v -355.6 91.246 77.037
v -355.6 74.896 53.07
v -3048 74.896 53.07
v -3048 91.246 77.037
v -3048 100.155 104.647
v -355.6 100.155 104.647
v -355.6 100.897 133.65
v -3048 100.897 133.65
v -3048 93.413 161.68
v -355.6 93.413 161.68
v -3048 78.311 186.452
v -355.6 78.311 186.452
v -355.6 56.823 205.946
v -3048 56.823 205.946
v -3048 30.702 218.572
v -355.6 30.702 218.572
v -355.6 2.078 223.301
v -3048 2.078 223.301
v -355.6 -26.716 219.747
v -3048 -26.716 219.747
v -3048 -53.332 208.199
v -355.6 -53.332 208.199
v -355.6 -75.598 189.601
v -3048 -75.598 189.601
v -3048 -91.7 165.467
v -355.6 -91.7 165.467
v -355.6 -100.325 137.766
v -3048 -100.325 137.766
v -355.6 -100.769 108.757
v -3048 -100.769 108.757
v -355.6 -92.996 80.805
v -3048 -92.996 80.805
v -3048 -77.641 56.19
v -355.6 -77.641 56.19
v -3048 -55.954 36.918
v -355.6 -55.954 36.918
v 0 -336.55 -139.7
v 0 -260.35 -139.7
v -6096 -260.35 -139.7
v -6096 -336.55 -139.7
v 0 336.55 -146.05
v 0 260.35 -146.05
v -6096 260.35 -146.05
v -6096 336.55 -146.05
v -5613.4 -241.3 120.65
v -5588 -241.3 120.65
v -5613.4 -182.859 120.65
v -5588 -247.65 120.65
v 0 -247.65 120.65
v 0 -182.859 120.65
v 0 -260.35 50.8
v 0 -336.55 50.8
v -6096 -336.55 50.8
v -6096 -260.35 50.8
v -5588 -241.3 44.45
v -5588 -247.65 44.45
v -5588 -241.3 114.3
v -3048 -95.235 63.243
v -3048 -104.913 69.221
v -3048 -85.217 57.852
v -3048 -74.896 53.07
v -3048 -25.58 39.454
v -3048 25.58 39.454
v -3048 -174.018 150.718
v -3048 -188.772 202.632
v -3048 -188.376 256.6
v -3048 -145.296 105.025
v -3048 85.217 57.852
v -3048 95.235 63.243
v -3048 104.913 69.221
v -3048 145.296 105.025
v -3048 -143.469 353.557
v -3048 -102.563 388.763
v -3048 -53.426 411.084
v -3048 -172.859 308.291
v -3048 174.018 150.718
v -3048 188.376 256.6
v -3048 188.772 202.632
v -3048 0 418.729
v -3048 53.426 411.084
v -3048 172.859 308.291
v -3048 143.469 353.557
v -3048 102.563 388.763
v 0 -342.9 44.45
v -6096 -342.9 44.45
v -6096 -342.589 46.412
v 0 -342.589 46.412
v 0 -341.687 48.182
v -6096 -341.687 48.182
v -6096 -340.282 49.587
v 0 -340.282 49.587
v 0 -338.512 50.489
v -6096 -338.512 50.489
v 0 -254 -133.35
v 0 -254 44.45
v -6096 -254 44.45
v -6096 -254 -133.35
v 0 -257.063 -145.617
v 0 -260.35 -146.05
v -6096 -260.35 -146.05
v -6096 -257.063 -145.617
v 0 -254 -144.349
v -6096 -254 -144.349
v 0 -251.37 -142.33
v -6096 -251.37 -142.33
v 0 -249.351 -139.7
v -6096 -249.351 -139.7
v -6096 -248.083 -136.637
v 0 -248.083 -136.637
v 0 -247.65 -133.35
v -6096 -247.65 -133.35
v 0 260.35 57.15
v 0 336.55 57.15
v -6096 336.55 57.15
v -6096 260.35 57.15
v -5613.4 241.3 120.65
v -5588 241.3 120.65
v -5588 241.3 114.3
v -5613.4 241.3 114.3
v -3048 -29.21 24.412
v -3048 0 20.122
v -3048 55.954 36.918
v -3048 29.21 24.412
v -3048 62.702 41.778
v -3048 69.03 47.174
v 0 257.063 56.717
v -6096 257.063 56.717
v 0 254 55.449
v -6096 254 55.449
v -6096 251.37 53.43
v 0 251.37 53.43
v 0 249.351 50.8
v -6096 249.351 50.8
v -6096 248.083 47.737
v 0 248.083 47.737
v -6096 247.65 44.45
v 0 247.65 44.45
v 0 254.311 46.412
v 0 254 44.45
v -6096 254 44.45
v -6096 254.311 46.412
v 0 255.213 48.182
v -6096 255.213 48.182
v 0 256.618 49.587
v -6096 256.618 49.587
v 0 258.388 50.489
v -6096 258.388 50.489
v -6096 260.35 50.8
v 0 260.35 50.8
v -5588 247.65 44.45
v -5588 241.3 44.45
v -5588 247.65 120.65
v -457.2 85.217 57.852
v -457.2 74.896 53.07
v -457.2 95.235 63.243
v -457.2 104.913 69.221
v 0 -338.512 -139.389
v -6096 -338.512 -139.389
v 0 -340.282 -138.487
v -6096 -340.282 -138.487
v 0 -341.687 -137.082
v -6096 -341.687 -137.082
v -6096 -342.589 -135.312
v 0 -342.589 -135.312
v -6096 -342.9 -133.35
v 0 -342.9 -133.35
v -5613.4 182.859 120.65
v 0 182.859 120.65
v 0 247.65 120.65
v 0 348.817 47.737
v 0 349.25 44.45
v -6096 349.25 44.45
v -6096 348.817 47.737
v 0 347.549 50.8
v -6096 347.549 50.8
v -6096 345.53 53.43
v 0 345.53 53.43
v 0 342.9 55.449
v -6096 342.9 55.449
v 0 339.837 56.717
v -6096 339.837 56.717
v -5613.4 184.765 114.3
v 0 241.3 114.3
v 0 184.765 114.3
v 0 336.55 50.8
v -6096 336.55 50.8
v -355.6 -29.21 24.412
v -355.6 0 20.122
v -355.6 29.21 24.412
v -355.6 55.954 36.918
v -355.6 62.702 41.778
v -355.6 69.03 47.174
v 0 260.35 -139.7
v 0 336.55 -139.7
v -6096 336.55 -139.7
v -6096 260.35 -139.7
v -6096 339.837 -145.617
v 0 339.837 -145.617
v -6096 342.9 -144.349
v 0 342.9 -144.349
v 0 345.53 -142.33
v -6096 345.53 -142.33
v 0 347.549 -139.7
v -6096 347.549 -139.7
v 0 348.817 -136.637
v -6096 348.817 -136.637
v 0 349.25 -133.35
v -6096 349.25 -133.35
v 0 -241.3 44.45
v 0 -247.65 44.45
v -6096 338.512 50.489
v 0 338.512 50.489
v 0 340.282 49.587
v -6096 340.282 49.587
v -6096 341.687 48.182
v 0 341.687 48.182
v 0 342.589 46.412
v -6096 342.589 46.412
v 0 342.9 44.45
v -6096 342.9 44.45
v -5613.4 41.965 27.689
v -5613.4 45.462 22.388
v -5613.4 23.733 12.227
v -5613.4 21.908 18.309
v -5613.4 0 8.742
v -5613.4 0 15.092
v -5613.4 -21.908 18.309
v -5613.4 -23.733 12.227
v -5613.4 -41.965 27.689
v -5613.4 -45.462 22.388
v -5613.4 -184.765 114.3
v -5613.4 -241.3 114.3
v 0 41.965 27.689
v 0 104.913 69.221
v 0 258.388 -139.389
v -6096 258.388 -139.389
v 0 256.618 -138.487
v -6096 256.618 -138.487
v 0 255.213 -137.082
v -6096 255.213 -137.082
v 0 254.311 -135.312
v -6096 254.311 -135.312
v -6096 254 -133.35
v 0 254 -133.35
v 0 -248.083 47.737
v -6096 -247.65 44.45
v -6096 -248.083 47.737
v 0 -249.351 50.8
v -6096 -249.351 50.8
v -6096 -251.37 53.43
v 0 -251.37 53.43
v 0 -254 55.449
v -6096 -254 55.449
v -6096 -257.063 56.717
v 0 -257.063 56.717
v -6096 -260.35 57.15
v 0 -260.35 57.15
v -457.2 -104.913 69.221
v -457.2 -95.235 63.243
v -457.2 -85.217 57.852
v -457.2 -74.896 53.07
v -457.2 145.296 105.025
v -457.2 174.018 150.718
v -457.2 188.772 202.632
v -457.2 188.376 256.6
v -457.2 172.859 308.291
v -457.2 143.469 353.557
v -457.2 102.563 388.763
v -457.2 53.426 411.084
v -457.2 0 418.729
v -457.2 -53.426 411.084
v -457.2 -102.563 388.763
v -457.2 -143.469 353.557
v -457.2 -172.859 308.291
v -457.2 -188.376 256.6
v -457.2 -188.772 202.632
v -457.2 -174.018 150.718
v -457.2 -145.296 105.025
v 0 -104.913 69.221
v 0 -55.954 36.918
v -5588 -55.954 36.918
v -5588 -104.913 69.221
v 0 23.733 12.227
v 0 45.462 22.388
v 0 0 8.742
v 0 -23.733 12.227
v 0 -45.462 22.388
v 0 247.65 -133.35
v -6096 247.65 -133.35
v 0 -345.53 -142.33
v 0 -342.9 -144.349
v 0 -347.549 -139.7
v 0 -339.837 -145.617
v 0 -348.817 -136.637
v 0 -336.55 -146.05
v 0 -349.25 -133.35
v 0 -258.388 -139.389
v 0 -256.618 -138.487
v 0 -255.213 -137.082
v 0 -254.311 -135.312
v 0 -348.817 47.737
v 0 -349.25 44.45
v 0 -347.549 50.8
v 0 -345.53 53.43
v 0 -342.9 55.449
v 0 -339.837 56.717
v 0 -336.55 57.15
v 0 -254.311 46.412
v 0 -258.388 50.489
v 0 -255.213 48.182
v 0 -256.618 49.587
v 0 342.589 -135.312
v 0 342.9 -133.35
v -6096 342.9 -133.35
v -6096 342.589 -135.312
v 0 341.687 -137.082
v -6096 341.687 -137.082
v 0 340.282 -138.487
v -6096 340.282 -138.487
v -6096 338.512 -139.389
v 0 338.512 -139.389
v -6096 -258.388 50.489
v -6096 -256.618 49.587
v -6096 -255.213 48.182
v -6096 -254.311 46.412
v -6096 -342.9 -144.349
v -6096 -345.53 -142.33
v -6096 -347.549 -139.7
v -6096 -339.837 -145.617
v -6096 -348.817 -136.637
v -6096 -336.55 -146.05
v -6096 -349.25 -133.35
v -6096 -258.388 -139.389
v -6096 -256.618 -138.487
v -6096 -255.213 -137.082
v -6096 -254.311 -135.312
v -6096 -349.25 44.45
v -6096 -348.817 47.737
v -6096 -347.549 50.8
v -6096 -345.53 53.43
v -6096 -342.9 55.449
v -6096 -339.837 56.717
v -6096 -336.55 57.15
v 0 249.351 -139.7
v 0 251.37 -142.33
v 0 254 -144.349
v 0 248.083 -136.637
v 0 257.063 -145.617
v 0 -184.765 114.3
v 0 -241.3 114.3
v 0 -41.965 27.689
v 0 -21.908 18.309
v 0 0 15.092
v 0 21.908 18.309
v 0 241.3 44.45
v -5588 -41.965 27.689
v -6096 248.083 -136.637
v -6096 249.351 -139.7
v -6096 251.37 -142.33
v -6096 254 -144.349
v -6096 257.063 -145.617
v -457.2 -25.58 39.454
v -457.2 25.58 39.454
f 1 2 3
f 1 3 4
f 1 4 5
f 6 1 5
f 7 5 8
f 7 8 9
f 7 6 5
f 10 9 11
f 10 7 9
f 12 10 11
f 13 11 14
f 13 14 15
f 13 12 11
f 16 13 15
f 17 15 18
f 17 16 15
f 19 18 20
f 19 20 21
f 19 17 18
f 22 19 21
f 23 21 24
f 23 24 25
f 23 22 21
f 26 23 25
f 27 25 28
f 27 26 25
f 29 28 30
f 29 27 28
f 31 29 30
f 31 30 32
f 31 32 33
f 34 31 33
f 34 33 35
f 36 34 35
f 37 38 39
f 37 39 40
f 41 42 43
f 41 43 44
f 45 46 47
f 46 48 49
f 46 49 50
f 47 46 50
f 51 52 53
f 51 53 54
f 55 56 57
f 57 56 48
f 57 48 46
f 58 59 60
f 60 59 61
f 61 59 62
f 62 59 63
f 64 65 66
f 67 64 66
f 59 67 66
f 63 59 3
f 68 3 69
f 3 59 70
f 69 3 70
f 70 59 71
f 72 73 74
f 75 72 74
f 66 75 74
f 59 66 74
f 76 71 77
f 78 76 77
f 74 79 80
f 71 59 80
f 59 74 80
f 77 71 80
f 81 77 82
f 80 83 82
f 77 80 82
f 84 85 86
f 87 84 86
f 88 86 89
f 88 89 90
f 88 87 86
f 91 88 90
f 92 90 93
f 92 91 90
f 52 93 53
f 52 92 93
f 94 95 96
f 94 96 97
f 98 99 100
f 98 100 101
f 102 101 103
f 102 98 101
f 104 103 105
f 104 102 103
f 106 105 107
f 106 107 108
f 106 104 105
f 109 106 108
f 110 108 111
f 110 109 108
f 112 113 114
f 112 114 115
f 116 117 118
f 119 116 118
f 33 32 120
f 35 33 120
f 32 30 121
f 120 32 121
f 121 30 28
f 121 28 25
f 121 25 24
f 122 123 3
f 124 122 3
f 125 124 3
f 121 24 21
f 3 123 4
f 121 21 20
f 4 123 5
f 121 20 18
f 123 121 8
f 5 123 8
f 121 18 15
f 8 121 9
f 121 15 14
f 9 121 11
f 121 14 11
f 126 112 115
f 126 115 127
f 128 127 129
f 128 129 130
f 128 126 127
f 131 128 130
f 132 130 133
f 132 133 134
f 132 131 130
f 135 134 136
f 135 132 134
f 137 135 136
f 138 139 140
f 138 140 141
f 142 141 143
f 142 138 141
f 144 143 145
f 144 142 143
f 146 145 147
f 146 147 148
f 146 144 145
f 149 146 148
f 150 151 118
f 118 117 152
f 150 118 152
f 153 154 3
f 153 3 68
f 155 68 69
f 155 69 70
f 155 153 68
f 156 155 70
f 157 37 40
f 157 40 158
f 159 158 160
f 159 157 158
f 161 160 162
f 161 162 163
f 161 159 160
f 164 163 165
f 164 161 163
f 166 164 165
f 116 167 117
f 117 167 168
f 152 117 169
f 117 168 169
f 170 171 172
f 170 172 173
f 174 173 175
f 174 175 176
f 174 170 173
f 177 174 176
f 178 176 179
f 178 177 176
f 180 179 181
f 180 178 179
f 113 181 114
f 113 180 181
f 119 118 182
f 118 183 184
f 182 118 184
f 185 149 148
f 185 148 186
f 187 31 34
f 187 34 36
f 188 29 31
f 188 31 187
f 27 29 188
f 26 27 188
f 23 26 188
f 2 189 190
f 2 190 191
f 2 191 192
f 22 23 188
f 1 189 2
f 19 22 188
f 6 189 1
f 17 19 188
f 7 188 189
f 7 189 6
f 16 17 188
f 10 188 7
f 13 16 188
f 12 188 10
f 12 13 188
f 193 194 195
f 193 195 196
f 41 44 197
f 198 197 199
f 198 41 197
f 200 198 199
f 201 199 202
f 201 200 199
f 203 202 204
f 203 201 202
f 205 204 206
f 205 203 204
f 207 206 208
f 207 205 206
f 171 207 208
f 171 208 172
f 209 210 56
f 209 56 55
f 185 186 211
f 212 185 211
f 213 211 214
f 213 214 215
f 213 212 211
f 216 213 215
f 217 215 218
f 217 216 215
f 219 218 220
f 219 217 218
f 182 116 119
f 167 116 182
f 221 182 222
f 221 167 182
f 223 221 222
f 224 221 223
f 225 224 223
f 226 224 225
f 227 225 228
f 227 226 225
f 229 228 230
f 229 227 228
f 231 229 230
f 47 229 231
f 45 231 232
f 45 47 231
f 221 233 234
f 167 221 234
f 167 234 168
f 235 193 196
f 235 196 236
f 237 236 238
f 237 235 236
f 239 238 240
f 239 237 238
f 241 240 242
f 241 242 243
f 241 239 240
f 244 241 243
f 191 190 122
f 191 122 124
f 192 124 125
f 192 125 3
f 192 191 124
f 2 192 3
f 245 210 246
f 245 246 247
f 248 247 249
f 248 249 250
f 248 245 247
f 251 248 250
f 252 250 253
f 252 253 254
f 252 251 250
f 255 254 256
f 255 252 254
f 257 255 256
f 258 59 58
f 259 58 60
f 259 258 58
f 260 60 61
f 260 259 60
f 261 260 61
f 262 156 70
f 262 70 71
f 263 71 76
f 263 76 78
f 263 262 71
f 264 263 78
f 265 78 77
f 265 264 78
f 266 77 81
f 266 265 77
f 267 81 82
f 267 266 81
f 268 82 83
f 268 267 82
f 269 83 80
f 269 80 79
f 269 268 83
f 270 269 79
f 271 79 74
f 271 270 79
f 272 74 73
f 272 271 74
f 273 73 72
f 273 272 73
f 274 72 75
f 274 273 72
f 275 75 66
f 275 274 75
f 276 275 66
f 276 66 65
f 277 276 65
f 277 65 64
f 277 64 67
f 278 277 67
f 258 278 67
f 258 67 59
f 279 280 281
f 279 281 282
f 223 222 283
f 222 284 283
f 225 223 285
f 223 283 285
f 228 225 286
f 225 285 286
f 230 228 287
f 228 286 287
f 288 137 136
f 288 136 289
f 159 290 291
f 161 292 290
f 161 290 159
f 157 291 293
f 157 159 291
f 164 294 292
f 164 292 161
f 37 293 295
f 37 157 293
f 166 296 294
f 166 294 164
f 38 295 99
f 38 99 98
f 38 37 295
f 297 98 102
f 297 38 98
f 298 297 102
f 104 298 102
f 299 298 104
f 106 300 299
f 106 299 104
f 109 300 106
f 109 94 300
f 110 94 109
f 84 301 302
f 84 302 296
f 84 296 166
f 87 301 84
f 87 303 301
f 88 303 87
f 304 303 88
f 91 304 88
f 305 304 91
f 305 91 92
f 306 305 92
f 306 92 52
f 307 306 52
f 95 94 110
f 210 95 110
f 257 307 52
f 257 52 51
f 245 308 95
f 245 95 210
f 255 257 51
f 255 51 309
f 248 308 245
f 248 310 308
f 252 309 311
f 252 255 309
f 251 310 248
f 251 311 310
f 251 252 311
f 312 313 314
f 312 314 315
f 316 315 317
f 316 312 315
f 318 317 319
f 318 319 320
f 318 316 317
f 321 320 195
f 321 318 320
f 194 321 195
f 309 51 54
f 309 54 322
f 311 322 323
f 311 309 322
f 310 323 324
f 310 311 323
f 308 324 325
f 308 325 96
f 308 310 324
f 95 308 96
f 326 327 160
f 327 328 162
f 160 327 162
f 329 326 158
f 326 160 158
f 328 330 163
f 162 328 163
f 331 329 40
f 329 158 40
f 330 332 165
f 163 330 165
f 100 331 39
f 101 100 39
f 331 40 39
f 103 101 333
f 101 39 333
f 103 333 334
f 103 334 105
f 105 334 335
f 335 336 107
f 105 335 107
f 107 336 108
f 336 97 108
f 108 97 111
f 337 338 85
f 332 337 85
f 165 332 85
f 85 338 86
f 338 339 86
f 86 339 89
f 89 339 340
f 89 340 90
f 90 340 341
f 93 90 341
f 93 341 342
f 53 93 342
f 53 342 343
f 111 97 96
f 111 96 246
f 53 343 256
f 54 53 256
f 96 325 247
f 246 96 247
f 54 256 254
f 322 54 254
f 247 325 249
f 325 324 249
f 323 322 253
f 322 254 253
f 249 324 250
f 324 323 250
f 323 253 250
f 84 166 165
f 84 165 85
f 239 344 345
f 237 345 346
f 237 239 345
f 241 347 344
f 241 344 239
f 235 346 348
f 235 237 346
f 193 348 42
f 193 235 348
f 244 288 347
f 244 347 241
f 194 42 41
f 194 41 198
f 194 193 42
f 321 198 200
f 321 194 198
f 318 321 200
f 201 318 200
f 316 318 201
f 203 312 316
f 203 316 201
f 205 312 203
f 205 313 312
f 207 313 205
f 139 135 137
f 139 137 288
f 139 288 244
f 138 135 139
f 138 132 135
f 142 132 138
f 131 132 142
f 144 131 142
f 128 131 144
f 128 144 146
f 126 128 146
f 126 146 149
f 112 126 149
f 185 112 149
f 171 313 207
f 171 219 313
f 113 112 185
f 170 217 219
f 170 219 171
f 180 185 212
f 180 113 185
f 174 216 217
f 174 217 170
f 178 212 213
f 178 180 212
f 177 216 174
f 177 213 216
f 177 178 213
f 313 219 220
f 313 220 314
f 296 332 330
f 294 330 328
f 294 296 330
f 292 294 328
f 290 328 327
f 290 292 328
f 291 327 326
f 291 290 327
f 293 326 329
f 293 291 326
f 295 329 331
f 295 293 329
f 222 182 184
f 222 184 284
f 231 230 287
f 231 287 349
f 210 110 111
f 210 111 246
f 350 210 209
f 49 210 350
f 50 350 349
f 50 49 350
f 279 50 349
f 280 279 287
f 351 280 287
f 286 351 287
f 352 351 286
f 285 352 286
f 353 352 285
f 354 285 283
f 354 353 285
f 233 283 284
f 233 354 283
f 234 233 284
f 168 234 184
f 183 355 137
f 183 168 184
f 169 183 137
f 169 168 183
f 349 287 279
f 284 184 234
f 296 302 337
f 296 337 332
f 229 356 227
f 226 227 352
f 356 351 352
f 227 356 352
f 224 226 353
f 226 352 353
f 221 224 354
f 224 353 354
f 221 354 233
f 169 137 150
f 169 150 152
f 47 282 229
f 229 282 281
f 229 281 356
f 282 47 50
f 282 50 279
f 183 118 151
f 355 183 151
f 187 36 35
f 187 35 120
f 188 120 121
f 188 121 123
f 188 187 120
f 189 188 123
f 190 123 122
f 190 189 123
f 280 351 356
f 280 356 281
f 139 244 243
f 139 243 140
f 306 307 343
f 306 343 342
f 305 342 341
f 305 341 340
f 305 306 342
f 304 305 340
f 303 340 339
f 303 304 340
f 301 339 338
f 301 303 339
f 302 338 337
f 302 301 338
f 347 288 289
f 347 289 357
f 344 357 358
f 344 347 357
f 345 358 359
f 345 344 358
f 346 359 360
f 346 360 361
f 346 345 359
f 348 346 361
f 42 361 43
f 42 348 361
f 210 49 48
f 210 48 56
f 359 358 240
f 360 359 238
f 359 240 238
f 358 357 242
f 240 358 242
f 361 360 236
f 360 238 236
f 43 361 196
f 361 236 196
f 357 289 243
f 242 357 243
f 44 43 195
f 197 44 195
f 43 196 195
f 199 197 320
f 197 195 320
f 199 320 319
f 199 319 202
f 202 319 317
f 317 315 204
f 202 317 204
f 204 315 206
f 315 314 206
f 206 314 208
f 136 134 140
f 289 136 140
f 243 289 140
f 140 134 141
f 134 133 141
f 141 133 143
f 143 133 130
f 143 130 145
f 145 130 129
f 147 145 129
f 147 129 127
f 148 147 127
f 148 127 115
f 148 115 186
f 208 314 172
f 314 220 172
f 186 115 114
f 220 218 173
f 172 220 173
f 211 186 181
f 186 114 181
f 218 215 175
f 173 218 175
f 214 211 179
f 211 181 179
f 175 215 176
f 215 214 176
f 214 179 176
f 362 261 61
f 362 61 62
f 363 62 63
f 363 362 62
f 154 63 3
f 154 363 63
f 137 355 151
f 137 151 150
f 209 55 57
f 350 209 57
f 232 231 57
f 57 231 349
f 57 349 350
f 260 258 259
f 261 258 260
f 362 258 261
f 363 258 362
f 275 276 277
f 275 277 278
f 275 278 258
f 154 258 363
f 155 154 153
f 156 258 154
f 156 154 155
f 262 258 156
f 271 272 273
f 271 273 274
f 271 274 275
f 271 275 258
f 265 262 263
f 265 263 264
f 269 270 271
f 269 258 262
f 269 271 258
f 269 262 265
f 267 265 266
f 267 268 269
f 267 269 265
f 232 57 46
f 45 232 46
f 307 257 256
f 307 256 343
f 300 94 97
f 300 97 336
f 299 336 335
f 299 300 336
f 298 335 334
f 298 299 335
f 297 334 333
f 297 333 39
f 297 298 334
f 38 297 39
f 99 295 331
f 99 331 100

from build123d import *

# Parameters (mm, degrees)
F1_DEPTH = 6096
F2_DEPTH = 5588
F3_START = -355.6
F3_DEPTH = 2692.4
F4_START = -457.2
F4_DEPTH = 2590.8
F7_DEPTH = 25.4


# Not quite as in the source:
# - a feature names something its author has since deleted; it is built from what else it names


with BuildPart() as f1:
    # F0 (on Right) → F1 (new body)
    with BuildSketch(Plane.YZ):
        with BuildLine():
            Line((-278.751844046, 57.15), (-336.55, 57.15))
            ThreePointArc((-336.55, 57.15), (-345.5302561211, 53.4302561211), (-349.25, 44.45))
            Line((-349.25, 44.45), (-349.25, -133.35))
            ThreePointArc((-349.25, -133.35), (-345.5302561211, -142.3302561211), (-336.55, -146.05))
            Line((-336.55, -146.05), (-260.35, -146.05))
            ThreePointArc((-260.35, -146.05), (-251.3697438789, -142.3302561211), (-247.65, -133.35))
            Line((-247.65, -133.35), (-247.65, 44.45))
            ThreePointArc((-247.65, 44.45), (-251.3697438789, 53.4302561211), (-260.35, 57.15))
            Line((-260.35, 57.15), (-268.1402802436, 57.15))
            Line((-268.1402802436, 57.15), (-269.3472818438, 57.15))
            Line((-269.3472818438, 57.15), (-278.751844046, 57.15))
        make_face()
        with BuildLine():
            ThreePointArc((-342.9, 44.45), (-341.0401280605, 48.9401280605), (-336.55, 50.8))
            Line((-336.55, 50.8), (-260.35, 50.8))
            ThreePointArc((-260.35, 50.8), (-255.8598719395, 48.9401280605), (-254, 44.45))
            Line((-254, 44.45), (-254, -133.35))
            ThreePointArc((-254, -133.35), (-255.8598719395, -137.8401280605), (-260.35, -139.7))
            Line((-260.35, -139.7), (-336.55, -139.7))
            ThreePointArc((-336.55, -139.7), (-341.0401280605, -137.8401280605), (-342.9, -133.35))
            Line((-342.9, -133.35), (-342.9, 44.45))
        make_face(mode=Mode.SUBTRACT)
    extrude(amount=-F1_DEPTH)


with BuildPart() as f1b:
    # F0 (on Right) → F1, piece 2 (new body)
    with BuildSketch(Plane.YZ):
        with BuildLine():
            ThreePointArc((260.35, 57.15), (251.3697438789, 53.4302561211), (247.65, 44.45))
            Line((247.65, 44.45), (247.65, -133.35))
            ThreePointArc((247.65, -133.35), (251.3697438789, -142.3302561211), (260.35, -146.05))
            Line((260.35, -146.05), (336.55, -146.05))
            ThreePointArc((336.55, -146.05), (345.5302561211, -142.3302561211), (349.25, -133.35))
            Line((349.25, -133.35), (349.25, 44.45))
            ThreePointArc((349.25, 44.45), (345.5302561211, 53.4302561211), (336.55, 57.15))
            Line((336.55, 57.15), (260.35, 57.15))
        make_face()
        with BuildLine():
            Line((260.35, 50.8), (336.55, 50.8))
            ThreePointArc((336.55, 50.8), (341.0401280605, 48.9401280605), (342.9, 44.45))
            Line((342.9, 44.45), (342.9, -133.35))
            ThreePointArc((342.9, -133.35), (341.0401280605, -137.8401280605), (336.55, -139.7))
            Line((336.55, -139.7), (260.35, -139.7))
            ThreePointArc((260.35, -139.7), (255.8598719395, -137.8401280605), (254, -133.35))
            Line((254, -133.35), (254, 44.45))
            ThreePointArc((254, 44.45), (255.8598719395, 48.9401280605), (260.35, 50.8))
        make_face(mode=Mode.SUBTRACT)
    extrude(amount=-F1_DEPTH)


with BuildPart() as f2:
    # F0 (on Right) → F2 (new body)
    with BuildSketch(Plane.YZ):
        with BuildLine():
            Line((-247.65, 120.65), (-247.65, 44.45))
            Line((-247.65, 44.45), (-241.3, 44.45))
            Line((-241.3, 44.45), (-241.3, 114.3))
            Line((-241.3, 114.3), (-184.7652837227, 114.3))
            Line((-184.7652837227, 114.3), (-45.4622963682, 22.3882611001))
            ThreePointArc((-45.4622963682, 22.3882611001), (0, 8.7416870594), (45.4622963682, 22.3882611001))
            Line((45.4622963682, 22.3882611001), (184.7652837227, 114.3))
            Line((184.7652837227, 114.3), (241.3, 114.3))
            Line((241.3, 114.3), (241.3, 44.45))
            Line((241.3, 44.45), (247.65, 44.45))
            Line((247.65, 44.45), (247.65, 120.65))
            Line((247.65, 120.65), (182.8591823578, 120.65))
            Line((182.8591823578, 120.65), (104.9129874888, 69.2213088636))
            Line((104.9129874888, 69.2213088636), (55.9535927255, 36.9180309968))
            Line((55.9535927255, 36.9180309968), (41.9651966475, 27.6885246354))
            ThreePointArc((41.9651966475, 27.6885246354), (0, 15.0916870594), (-41.9651966475, 27.6885246354))
            Line((-41.9651966475, 27.6885246354), (-55.9535977541, 36.9180343146))
            Line((-55.9535977541, 36.9180343146), (-104.9129888218, 69.2213097431))
            Line((-104.9129888218, 69.2213097431), (-182.8591823578, 120.65))
            Line((-182.8591823578, 120.65), (-247.65, 120.65))
        make_face()
    extrude(amount=-F2_DEPTH)

    # F6 (on face) → F7 (join)
    with BuildSketch(Plane(origin=(-5588, 0, 0), x_dir=(0, -1, 0), z_dir=(-1, 0, 0))):
        with BuildLine():
            Line((-241.3, 120.65), (-241.3, 114.3))
            Line((-241.3, 114.3), (-184.7652837227, 114.3))
            Line((-184.7652837227, 114.3), (-45.4622963682, 22.3882611001))
            ThreePointArc((-45.4622963682, 22.3882611001), (0, 8.7416870594), (45.4622963682, 22.3882611001))
            Line((45.4622963682, 22.3882611001), (184.7652837227, 114.3))
            Line((184.7652837227, 114.3), (241.3, 114.3))
            Line((241.3, 114.3), (241.3, 120.65))
            Line((241.3, 120.65), (182.8591823578, 120.65))
            Line((182.8591823578, 120.65), (41.9651966475, 27.6885246354))
            ThreePointArc((41.9651966475, 27.6885246354), (0, 15.0916870594), (-41.9651966475, 27.6885246354))
            Line((-41.9651966475, 27.6885246354), (-182.8591823578, 120.65))
            Line((-182.8591823578, 120.65), (-241.3, 120.65))
        make_face()
    extrude(amount=F7_DEPTH)


with BuildPart() as f3:
    # F0 (on Right) → F3 (new body)
    with BuildSketch(Plane.YZ.offset(F3_START)):
        with BuildLine():
            ThreePointArc((-74.8958186051, 53.0696722179), (-65.9212506869, 44.4115211281), (-55.9535977541, 36.9180343146))
            ThreePointArc((-55.9535977541, 36.9180343146), (-3.0123e-06, 20.1222494126), (55.9535927255, 36.9180309968))
            ThreePointArc((55.9535927255, 36.9180309968), (65.9212483948, 44.4115191736), (74.8958186051, 53.0696722179))
            ThreePointArc((74.8958186051, 53.0696722179), (0, 37.7292176485), (-74.8958186051, 53.0696722179))
        make_face()
        with BuildLine():
            ThreePointArc((101.6, 121.7222494126), (-36.8316767859, 216.4111483667), (-74.8958186051, 53.0696722179))
            ThreePointArc((-74.8958186051, 53.0696722179), (0, 37.7292176485), (74.8958186051, 53.0696722179))
            ThreePointArc((74.8958186051, 53.0696722179), (94.6888989541, 84.8905726267), (101.6, 121.7222494126))
        make_face()
    extrude(amount=-F3_DEPTH)


with BuildPart() as f4:
    # F0 (on Right) → F4 (new body)
    with BuildSketch(Plane.YZ.offset(F4_START)):
        with BuildLine():
            ThreePointArc((190.5, 228.2292176485), (-90.2893283546, 395.9733298709), (-104.9129888218, 69.2213097431))
            ThreePointArc((-104.9129888218, 69.2213097431), (-90.2663871868, 60.4727592207), (-74.8958186051, 53.0696722179))
            ThreePointArc((-74.8958186051, 53.0696722179), (-36.8316767859, 216.4111483667), (101.6, 121.7222494126))
            ThreePointArc((101.6, 121.7222494126), (94.6888989541, 84.8905726267), (74.8958186051, 53.0696722179))
            ThreePointArc((74.8958186051, 53.0696722179), (90.2663864837, 60.4727588424), (104.9129874888, 69.2213088636))
            ThreePointArc((104.9129874888, 69.2213088636), (167.7441118439, 137.9398885908), (190.5, 228.2292176485))
        make_face()
        with BuildLine():
            ThreePointArc((101.6, 121.7222494126), (-36.8316767859, 216.4111483667), (-74.8958186051, 53.0696722179))
            ThreePointArc((-74.8958186051, 53.0696722179), (0, 37.7292176485), (74.8958186051, 53.0696722179))
            ThreePointArc((74.8958186051, 53.0696722179), (94.6888989541, 84.8905726267), (101.6, 121.7222494126))
        make_face()
    extrude(amount=-F4_DEPTH)


solid = Compound([f1.part, f1b.part, f2.part, f3.part, f4.part])
